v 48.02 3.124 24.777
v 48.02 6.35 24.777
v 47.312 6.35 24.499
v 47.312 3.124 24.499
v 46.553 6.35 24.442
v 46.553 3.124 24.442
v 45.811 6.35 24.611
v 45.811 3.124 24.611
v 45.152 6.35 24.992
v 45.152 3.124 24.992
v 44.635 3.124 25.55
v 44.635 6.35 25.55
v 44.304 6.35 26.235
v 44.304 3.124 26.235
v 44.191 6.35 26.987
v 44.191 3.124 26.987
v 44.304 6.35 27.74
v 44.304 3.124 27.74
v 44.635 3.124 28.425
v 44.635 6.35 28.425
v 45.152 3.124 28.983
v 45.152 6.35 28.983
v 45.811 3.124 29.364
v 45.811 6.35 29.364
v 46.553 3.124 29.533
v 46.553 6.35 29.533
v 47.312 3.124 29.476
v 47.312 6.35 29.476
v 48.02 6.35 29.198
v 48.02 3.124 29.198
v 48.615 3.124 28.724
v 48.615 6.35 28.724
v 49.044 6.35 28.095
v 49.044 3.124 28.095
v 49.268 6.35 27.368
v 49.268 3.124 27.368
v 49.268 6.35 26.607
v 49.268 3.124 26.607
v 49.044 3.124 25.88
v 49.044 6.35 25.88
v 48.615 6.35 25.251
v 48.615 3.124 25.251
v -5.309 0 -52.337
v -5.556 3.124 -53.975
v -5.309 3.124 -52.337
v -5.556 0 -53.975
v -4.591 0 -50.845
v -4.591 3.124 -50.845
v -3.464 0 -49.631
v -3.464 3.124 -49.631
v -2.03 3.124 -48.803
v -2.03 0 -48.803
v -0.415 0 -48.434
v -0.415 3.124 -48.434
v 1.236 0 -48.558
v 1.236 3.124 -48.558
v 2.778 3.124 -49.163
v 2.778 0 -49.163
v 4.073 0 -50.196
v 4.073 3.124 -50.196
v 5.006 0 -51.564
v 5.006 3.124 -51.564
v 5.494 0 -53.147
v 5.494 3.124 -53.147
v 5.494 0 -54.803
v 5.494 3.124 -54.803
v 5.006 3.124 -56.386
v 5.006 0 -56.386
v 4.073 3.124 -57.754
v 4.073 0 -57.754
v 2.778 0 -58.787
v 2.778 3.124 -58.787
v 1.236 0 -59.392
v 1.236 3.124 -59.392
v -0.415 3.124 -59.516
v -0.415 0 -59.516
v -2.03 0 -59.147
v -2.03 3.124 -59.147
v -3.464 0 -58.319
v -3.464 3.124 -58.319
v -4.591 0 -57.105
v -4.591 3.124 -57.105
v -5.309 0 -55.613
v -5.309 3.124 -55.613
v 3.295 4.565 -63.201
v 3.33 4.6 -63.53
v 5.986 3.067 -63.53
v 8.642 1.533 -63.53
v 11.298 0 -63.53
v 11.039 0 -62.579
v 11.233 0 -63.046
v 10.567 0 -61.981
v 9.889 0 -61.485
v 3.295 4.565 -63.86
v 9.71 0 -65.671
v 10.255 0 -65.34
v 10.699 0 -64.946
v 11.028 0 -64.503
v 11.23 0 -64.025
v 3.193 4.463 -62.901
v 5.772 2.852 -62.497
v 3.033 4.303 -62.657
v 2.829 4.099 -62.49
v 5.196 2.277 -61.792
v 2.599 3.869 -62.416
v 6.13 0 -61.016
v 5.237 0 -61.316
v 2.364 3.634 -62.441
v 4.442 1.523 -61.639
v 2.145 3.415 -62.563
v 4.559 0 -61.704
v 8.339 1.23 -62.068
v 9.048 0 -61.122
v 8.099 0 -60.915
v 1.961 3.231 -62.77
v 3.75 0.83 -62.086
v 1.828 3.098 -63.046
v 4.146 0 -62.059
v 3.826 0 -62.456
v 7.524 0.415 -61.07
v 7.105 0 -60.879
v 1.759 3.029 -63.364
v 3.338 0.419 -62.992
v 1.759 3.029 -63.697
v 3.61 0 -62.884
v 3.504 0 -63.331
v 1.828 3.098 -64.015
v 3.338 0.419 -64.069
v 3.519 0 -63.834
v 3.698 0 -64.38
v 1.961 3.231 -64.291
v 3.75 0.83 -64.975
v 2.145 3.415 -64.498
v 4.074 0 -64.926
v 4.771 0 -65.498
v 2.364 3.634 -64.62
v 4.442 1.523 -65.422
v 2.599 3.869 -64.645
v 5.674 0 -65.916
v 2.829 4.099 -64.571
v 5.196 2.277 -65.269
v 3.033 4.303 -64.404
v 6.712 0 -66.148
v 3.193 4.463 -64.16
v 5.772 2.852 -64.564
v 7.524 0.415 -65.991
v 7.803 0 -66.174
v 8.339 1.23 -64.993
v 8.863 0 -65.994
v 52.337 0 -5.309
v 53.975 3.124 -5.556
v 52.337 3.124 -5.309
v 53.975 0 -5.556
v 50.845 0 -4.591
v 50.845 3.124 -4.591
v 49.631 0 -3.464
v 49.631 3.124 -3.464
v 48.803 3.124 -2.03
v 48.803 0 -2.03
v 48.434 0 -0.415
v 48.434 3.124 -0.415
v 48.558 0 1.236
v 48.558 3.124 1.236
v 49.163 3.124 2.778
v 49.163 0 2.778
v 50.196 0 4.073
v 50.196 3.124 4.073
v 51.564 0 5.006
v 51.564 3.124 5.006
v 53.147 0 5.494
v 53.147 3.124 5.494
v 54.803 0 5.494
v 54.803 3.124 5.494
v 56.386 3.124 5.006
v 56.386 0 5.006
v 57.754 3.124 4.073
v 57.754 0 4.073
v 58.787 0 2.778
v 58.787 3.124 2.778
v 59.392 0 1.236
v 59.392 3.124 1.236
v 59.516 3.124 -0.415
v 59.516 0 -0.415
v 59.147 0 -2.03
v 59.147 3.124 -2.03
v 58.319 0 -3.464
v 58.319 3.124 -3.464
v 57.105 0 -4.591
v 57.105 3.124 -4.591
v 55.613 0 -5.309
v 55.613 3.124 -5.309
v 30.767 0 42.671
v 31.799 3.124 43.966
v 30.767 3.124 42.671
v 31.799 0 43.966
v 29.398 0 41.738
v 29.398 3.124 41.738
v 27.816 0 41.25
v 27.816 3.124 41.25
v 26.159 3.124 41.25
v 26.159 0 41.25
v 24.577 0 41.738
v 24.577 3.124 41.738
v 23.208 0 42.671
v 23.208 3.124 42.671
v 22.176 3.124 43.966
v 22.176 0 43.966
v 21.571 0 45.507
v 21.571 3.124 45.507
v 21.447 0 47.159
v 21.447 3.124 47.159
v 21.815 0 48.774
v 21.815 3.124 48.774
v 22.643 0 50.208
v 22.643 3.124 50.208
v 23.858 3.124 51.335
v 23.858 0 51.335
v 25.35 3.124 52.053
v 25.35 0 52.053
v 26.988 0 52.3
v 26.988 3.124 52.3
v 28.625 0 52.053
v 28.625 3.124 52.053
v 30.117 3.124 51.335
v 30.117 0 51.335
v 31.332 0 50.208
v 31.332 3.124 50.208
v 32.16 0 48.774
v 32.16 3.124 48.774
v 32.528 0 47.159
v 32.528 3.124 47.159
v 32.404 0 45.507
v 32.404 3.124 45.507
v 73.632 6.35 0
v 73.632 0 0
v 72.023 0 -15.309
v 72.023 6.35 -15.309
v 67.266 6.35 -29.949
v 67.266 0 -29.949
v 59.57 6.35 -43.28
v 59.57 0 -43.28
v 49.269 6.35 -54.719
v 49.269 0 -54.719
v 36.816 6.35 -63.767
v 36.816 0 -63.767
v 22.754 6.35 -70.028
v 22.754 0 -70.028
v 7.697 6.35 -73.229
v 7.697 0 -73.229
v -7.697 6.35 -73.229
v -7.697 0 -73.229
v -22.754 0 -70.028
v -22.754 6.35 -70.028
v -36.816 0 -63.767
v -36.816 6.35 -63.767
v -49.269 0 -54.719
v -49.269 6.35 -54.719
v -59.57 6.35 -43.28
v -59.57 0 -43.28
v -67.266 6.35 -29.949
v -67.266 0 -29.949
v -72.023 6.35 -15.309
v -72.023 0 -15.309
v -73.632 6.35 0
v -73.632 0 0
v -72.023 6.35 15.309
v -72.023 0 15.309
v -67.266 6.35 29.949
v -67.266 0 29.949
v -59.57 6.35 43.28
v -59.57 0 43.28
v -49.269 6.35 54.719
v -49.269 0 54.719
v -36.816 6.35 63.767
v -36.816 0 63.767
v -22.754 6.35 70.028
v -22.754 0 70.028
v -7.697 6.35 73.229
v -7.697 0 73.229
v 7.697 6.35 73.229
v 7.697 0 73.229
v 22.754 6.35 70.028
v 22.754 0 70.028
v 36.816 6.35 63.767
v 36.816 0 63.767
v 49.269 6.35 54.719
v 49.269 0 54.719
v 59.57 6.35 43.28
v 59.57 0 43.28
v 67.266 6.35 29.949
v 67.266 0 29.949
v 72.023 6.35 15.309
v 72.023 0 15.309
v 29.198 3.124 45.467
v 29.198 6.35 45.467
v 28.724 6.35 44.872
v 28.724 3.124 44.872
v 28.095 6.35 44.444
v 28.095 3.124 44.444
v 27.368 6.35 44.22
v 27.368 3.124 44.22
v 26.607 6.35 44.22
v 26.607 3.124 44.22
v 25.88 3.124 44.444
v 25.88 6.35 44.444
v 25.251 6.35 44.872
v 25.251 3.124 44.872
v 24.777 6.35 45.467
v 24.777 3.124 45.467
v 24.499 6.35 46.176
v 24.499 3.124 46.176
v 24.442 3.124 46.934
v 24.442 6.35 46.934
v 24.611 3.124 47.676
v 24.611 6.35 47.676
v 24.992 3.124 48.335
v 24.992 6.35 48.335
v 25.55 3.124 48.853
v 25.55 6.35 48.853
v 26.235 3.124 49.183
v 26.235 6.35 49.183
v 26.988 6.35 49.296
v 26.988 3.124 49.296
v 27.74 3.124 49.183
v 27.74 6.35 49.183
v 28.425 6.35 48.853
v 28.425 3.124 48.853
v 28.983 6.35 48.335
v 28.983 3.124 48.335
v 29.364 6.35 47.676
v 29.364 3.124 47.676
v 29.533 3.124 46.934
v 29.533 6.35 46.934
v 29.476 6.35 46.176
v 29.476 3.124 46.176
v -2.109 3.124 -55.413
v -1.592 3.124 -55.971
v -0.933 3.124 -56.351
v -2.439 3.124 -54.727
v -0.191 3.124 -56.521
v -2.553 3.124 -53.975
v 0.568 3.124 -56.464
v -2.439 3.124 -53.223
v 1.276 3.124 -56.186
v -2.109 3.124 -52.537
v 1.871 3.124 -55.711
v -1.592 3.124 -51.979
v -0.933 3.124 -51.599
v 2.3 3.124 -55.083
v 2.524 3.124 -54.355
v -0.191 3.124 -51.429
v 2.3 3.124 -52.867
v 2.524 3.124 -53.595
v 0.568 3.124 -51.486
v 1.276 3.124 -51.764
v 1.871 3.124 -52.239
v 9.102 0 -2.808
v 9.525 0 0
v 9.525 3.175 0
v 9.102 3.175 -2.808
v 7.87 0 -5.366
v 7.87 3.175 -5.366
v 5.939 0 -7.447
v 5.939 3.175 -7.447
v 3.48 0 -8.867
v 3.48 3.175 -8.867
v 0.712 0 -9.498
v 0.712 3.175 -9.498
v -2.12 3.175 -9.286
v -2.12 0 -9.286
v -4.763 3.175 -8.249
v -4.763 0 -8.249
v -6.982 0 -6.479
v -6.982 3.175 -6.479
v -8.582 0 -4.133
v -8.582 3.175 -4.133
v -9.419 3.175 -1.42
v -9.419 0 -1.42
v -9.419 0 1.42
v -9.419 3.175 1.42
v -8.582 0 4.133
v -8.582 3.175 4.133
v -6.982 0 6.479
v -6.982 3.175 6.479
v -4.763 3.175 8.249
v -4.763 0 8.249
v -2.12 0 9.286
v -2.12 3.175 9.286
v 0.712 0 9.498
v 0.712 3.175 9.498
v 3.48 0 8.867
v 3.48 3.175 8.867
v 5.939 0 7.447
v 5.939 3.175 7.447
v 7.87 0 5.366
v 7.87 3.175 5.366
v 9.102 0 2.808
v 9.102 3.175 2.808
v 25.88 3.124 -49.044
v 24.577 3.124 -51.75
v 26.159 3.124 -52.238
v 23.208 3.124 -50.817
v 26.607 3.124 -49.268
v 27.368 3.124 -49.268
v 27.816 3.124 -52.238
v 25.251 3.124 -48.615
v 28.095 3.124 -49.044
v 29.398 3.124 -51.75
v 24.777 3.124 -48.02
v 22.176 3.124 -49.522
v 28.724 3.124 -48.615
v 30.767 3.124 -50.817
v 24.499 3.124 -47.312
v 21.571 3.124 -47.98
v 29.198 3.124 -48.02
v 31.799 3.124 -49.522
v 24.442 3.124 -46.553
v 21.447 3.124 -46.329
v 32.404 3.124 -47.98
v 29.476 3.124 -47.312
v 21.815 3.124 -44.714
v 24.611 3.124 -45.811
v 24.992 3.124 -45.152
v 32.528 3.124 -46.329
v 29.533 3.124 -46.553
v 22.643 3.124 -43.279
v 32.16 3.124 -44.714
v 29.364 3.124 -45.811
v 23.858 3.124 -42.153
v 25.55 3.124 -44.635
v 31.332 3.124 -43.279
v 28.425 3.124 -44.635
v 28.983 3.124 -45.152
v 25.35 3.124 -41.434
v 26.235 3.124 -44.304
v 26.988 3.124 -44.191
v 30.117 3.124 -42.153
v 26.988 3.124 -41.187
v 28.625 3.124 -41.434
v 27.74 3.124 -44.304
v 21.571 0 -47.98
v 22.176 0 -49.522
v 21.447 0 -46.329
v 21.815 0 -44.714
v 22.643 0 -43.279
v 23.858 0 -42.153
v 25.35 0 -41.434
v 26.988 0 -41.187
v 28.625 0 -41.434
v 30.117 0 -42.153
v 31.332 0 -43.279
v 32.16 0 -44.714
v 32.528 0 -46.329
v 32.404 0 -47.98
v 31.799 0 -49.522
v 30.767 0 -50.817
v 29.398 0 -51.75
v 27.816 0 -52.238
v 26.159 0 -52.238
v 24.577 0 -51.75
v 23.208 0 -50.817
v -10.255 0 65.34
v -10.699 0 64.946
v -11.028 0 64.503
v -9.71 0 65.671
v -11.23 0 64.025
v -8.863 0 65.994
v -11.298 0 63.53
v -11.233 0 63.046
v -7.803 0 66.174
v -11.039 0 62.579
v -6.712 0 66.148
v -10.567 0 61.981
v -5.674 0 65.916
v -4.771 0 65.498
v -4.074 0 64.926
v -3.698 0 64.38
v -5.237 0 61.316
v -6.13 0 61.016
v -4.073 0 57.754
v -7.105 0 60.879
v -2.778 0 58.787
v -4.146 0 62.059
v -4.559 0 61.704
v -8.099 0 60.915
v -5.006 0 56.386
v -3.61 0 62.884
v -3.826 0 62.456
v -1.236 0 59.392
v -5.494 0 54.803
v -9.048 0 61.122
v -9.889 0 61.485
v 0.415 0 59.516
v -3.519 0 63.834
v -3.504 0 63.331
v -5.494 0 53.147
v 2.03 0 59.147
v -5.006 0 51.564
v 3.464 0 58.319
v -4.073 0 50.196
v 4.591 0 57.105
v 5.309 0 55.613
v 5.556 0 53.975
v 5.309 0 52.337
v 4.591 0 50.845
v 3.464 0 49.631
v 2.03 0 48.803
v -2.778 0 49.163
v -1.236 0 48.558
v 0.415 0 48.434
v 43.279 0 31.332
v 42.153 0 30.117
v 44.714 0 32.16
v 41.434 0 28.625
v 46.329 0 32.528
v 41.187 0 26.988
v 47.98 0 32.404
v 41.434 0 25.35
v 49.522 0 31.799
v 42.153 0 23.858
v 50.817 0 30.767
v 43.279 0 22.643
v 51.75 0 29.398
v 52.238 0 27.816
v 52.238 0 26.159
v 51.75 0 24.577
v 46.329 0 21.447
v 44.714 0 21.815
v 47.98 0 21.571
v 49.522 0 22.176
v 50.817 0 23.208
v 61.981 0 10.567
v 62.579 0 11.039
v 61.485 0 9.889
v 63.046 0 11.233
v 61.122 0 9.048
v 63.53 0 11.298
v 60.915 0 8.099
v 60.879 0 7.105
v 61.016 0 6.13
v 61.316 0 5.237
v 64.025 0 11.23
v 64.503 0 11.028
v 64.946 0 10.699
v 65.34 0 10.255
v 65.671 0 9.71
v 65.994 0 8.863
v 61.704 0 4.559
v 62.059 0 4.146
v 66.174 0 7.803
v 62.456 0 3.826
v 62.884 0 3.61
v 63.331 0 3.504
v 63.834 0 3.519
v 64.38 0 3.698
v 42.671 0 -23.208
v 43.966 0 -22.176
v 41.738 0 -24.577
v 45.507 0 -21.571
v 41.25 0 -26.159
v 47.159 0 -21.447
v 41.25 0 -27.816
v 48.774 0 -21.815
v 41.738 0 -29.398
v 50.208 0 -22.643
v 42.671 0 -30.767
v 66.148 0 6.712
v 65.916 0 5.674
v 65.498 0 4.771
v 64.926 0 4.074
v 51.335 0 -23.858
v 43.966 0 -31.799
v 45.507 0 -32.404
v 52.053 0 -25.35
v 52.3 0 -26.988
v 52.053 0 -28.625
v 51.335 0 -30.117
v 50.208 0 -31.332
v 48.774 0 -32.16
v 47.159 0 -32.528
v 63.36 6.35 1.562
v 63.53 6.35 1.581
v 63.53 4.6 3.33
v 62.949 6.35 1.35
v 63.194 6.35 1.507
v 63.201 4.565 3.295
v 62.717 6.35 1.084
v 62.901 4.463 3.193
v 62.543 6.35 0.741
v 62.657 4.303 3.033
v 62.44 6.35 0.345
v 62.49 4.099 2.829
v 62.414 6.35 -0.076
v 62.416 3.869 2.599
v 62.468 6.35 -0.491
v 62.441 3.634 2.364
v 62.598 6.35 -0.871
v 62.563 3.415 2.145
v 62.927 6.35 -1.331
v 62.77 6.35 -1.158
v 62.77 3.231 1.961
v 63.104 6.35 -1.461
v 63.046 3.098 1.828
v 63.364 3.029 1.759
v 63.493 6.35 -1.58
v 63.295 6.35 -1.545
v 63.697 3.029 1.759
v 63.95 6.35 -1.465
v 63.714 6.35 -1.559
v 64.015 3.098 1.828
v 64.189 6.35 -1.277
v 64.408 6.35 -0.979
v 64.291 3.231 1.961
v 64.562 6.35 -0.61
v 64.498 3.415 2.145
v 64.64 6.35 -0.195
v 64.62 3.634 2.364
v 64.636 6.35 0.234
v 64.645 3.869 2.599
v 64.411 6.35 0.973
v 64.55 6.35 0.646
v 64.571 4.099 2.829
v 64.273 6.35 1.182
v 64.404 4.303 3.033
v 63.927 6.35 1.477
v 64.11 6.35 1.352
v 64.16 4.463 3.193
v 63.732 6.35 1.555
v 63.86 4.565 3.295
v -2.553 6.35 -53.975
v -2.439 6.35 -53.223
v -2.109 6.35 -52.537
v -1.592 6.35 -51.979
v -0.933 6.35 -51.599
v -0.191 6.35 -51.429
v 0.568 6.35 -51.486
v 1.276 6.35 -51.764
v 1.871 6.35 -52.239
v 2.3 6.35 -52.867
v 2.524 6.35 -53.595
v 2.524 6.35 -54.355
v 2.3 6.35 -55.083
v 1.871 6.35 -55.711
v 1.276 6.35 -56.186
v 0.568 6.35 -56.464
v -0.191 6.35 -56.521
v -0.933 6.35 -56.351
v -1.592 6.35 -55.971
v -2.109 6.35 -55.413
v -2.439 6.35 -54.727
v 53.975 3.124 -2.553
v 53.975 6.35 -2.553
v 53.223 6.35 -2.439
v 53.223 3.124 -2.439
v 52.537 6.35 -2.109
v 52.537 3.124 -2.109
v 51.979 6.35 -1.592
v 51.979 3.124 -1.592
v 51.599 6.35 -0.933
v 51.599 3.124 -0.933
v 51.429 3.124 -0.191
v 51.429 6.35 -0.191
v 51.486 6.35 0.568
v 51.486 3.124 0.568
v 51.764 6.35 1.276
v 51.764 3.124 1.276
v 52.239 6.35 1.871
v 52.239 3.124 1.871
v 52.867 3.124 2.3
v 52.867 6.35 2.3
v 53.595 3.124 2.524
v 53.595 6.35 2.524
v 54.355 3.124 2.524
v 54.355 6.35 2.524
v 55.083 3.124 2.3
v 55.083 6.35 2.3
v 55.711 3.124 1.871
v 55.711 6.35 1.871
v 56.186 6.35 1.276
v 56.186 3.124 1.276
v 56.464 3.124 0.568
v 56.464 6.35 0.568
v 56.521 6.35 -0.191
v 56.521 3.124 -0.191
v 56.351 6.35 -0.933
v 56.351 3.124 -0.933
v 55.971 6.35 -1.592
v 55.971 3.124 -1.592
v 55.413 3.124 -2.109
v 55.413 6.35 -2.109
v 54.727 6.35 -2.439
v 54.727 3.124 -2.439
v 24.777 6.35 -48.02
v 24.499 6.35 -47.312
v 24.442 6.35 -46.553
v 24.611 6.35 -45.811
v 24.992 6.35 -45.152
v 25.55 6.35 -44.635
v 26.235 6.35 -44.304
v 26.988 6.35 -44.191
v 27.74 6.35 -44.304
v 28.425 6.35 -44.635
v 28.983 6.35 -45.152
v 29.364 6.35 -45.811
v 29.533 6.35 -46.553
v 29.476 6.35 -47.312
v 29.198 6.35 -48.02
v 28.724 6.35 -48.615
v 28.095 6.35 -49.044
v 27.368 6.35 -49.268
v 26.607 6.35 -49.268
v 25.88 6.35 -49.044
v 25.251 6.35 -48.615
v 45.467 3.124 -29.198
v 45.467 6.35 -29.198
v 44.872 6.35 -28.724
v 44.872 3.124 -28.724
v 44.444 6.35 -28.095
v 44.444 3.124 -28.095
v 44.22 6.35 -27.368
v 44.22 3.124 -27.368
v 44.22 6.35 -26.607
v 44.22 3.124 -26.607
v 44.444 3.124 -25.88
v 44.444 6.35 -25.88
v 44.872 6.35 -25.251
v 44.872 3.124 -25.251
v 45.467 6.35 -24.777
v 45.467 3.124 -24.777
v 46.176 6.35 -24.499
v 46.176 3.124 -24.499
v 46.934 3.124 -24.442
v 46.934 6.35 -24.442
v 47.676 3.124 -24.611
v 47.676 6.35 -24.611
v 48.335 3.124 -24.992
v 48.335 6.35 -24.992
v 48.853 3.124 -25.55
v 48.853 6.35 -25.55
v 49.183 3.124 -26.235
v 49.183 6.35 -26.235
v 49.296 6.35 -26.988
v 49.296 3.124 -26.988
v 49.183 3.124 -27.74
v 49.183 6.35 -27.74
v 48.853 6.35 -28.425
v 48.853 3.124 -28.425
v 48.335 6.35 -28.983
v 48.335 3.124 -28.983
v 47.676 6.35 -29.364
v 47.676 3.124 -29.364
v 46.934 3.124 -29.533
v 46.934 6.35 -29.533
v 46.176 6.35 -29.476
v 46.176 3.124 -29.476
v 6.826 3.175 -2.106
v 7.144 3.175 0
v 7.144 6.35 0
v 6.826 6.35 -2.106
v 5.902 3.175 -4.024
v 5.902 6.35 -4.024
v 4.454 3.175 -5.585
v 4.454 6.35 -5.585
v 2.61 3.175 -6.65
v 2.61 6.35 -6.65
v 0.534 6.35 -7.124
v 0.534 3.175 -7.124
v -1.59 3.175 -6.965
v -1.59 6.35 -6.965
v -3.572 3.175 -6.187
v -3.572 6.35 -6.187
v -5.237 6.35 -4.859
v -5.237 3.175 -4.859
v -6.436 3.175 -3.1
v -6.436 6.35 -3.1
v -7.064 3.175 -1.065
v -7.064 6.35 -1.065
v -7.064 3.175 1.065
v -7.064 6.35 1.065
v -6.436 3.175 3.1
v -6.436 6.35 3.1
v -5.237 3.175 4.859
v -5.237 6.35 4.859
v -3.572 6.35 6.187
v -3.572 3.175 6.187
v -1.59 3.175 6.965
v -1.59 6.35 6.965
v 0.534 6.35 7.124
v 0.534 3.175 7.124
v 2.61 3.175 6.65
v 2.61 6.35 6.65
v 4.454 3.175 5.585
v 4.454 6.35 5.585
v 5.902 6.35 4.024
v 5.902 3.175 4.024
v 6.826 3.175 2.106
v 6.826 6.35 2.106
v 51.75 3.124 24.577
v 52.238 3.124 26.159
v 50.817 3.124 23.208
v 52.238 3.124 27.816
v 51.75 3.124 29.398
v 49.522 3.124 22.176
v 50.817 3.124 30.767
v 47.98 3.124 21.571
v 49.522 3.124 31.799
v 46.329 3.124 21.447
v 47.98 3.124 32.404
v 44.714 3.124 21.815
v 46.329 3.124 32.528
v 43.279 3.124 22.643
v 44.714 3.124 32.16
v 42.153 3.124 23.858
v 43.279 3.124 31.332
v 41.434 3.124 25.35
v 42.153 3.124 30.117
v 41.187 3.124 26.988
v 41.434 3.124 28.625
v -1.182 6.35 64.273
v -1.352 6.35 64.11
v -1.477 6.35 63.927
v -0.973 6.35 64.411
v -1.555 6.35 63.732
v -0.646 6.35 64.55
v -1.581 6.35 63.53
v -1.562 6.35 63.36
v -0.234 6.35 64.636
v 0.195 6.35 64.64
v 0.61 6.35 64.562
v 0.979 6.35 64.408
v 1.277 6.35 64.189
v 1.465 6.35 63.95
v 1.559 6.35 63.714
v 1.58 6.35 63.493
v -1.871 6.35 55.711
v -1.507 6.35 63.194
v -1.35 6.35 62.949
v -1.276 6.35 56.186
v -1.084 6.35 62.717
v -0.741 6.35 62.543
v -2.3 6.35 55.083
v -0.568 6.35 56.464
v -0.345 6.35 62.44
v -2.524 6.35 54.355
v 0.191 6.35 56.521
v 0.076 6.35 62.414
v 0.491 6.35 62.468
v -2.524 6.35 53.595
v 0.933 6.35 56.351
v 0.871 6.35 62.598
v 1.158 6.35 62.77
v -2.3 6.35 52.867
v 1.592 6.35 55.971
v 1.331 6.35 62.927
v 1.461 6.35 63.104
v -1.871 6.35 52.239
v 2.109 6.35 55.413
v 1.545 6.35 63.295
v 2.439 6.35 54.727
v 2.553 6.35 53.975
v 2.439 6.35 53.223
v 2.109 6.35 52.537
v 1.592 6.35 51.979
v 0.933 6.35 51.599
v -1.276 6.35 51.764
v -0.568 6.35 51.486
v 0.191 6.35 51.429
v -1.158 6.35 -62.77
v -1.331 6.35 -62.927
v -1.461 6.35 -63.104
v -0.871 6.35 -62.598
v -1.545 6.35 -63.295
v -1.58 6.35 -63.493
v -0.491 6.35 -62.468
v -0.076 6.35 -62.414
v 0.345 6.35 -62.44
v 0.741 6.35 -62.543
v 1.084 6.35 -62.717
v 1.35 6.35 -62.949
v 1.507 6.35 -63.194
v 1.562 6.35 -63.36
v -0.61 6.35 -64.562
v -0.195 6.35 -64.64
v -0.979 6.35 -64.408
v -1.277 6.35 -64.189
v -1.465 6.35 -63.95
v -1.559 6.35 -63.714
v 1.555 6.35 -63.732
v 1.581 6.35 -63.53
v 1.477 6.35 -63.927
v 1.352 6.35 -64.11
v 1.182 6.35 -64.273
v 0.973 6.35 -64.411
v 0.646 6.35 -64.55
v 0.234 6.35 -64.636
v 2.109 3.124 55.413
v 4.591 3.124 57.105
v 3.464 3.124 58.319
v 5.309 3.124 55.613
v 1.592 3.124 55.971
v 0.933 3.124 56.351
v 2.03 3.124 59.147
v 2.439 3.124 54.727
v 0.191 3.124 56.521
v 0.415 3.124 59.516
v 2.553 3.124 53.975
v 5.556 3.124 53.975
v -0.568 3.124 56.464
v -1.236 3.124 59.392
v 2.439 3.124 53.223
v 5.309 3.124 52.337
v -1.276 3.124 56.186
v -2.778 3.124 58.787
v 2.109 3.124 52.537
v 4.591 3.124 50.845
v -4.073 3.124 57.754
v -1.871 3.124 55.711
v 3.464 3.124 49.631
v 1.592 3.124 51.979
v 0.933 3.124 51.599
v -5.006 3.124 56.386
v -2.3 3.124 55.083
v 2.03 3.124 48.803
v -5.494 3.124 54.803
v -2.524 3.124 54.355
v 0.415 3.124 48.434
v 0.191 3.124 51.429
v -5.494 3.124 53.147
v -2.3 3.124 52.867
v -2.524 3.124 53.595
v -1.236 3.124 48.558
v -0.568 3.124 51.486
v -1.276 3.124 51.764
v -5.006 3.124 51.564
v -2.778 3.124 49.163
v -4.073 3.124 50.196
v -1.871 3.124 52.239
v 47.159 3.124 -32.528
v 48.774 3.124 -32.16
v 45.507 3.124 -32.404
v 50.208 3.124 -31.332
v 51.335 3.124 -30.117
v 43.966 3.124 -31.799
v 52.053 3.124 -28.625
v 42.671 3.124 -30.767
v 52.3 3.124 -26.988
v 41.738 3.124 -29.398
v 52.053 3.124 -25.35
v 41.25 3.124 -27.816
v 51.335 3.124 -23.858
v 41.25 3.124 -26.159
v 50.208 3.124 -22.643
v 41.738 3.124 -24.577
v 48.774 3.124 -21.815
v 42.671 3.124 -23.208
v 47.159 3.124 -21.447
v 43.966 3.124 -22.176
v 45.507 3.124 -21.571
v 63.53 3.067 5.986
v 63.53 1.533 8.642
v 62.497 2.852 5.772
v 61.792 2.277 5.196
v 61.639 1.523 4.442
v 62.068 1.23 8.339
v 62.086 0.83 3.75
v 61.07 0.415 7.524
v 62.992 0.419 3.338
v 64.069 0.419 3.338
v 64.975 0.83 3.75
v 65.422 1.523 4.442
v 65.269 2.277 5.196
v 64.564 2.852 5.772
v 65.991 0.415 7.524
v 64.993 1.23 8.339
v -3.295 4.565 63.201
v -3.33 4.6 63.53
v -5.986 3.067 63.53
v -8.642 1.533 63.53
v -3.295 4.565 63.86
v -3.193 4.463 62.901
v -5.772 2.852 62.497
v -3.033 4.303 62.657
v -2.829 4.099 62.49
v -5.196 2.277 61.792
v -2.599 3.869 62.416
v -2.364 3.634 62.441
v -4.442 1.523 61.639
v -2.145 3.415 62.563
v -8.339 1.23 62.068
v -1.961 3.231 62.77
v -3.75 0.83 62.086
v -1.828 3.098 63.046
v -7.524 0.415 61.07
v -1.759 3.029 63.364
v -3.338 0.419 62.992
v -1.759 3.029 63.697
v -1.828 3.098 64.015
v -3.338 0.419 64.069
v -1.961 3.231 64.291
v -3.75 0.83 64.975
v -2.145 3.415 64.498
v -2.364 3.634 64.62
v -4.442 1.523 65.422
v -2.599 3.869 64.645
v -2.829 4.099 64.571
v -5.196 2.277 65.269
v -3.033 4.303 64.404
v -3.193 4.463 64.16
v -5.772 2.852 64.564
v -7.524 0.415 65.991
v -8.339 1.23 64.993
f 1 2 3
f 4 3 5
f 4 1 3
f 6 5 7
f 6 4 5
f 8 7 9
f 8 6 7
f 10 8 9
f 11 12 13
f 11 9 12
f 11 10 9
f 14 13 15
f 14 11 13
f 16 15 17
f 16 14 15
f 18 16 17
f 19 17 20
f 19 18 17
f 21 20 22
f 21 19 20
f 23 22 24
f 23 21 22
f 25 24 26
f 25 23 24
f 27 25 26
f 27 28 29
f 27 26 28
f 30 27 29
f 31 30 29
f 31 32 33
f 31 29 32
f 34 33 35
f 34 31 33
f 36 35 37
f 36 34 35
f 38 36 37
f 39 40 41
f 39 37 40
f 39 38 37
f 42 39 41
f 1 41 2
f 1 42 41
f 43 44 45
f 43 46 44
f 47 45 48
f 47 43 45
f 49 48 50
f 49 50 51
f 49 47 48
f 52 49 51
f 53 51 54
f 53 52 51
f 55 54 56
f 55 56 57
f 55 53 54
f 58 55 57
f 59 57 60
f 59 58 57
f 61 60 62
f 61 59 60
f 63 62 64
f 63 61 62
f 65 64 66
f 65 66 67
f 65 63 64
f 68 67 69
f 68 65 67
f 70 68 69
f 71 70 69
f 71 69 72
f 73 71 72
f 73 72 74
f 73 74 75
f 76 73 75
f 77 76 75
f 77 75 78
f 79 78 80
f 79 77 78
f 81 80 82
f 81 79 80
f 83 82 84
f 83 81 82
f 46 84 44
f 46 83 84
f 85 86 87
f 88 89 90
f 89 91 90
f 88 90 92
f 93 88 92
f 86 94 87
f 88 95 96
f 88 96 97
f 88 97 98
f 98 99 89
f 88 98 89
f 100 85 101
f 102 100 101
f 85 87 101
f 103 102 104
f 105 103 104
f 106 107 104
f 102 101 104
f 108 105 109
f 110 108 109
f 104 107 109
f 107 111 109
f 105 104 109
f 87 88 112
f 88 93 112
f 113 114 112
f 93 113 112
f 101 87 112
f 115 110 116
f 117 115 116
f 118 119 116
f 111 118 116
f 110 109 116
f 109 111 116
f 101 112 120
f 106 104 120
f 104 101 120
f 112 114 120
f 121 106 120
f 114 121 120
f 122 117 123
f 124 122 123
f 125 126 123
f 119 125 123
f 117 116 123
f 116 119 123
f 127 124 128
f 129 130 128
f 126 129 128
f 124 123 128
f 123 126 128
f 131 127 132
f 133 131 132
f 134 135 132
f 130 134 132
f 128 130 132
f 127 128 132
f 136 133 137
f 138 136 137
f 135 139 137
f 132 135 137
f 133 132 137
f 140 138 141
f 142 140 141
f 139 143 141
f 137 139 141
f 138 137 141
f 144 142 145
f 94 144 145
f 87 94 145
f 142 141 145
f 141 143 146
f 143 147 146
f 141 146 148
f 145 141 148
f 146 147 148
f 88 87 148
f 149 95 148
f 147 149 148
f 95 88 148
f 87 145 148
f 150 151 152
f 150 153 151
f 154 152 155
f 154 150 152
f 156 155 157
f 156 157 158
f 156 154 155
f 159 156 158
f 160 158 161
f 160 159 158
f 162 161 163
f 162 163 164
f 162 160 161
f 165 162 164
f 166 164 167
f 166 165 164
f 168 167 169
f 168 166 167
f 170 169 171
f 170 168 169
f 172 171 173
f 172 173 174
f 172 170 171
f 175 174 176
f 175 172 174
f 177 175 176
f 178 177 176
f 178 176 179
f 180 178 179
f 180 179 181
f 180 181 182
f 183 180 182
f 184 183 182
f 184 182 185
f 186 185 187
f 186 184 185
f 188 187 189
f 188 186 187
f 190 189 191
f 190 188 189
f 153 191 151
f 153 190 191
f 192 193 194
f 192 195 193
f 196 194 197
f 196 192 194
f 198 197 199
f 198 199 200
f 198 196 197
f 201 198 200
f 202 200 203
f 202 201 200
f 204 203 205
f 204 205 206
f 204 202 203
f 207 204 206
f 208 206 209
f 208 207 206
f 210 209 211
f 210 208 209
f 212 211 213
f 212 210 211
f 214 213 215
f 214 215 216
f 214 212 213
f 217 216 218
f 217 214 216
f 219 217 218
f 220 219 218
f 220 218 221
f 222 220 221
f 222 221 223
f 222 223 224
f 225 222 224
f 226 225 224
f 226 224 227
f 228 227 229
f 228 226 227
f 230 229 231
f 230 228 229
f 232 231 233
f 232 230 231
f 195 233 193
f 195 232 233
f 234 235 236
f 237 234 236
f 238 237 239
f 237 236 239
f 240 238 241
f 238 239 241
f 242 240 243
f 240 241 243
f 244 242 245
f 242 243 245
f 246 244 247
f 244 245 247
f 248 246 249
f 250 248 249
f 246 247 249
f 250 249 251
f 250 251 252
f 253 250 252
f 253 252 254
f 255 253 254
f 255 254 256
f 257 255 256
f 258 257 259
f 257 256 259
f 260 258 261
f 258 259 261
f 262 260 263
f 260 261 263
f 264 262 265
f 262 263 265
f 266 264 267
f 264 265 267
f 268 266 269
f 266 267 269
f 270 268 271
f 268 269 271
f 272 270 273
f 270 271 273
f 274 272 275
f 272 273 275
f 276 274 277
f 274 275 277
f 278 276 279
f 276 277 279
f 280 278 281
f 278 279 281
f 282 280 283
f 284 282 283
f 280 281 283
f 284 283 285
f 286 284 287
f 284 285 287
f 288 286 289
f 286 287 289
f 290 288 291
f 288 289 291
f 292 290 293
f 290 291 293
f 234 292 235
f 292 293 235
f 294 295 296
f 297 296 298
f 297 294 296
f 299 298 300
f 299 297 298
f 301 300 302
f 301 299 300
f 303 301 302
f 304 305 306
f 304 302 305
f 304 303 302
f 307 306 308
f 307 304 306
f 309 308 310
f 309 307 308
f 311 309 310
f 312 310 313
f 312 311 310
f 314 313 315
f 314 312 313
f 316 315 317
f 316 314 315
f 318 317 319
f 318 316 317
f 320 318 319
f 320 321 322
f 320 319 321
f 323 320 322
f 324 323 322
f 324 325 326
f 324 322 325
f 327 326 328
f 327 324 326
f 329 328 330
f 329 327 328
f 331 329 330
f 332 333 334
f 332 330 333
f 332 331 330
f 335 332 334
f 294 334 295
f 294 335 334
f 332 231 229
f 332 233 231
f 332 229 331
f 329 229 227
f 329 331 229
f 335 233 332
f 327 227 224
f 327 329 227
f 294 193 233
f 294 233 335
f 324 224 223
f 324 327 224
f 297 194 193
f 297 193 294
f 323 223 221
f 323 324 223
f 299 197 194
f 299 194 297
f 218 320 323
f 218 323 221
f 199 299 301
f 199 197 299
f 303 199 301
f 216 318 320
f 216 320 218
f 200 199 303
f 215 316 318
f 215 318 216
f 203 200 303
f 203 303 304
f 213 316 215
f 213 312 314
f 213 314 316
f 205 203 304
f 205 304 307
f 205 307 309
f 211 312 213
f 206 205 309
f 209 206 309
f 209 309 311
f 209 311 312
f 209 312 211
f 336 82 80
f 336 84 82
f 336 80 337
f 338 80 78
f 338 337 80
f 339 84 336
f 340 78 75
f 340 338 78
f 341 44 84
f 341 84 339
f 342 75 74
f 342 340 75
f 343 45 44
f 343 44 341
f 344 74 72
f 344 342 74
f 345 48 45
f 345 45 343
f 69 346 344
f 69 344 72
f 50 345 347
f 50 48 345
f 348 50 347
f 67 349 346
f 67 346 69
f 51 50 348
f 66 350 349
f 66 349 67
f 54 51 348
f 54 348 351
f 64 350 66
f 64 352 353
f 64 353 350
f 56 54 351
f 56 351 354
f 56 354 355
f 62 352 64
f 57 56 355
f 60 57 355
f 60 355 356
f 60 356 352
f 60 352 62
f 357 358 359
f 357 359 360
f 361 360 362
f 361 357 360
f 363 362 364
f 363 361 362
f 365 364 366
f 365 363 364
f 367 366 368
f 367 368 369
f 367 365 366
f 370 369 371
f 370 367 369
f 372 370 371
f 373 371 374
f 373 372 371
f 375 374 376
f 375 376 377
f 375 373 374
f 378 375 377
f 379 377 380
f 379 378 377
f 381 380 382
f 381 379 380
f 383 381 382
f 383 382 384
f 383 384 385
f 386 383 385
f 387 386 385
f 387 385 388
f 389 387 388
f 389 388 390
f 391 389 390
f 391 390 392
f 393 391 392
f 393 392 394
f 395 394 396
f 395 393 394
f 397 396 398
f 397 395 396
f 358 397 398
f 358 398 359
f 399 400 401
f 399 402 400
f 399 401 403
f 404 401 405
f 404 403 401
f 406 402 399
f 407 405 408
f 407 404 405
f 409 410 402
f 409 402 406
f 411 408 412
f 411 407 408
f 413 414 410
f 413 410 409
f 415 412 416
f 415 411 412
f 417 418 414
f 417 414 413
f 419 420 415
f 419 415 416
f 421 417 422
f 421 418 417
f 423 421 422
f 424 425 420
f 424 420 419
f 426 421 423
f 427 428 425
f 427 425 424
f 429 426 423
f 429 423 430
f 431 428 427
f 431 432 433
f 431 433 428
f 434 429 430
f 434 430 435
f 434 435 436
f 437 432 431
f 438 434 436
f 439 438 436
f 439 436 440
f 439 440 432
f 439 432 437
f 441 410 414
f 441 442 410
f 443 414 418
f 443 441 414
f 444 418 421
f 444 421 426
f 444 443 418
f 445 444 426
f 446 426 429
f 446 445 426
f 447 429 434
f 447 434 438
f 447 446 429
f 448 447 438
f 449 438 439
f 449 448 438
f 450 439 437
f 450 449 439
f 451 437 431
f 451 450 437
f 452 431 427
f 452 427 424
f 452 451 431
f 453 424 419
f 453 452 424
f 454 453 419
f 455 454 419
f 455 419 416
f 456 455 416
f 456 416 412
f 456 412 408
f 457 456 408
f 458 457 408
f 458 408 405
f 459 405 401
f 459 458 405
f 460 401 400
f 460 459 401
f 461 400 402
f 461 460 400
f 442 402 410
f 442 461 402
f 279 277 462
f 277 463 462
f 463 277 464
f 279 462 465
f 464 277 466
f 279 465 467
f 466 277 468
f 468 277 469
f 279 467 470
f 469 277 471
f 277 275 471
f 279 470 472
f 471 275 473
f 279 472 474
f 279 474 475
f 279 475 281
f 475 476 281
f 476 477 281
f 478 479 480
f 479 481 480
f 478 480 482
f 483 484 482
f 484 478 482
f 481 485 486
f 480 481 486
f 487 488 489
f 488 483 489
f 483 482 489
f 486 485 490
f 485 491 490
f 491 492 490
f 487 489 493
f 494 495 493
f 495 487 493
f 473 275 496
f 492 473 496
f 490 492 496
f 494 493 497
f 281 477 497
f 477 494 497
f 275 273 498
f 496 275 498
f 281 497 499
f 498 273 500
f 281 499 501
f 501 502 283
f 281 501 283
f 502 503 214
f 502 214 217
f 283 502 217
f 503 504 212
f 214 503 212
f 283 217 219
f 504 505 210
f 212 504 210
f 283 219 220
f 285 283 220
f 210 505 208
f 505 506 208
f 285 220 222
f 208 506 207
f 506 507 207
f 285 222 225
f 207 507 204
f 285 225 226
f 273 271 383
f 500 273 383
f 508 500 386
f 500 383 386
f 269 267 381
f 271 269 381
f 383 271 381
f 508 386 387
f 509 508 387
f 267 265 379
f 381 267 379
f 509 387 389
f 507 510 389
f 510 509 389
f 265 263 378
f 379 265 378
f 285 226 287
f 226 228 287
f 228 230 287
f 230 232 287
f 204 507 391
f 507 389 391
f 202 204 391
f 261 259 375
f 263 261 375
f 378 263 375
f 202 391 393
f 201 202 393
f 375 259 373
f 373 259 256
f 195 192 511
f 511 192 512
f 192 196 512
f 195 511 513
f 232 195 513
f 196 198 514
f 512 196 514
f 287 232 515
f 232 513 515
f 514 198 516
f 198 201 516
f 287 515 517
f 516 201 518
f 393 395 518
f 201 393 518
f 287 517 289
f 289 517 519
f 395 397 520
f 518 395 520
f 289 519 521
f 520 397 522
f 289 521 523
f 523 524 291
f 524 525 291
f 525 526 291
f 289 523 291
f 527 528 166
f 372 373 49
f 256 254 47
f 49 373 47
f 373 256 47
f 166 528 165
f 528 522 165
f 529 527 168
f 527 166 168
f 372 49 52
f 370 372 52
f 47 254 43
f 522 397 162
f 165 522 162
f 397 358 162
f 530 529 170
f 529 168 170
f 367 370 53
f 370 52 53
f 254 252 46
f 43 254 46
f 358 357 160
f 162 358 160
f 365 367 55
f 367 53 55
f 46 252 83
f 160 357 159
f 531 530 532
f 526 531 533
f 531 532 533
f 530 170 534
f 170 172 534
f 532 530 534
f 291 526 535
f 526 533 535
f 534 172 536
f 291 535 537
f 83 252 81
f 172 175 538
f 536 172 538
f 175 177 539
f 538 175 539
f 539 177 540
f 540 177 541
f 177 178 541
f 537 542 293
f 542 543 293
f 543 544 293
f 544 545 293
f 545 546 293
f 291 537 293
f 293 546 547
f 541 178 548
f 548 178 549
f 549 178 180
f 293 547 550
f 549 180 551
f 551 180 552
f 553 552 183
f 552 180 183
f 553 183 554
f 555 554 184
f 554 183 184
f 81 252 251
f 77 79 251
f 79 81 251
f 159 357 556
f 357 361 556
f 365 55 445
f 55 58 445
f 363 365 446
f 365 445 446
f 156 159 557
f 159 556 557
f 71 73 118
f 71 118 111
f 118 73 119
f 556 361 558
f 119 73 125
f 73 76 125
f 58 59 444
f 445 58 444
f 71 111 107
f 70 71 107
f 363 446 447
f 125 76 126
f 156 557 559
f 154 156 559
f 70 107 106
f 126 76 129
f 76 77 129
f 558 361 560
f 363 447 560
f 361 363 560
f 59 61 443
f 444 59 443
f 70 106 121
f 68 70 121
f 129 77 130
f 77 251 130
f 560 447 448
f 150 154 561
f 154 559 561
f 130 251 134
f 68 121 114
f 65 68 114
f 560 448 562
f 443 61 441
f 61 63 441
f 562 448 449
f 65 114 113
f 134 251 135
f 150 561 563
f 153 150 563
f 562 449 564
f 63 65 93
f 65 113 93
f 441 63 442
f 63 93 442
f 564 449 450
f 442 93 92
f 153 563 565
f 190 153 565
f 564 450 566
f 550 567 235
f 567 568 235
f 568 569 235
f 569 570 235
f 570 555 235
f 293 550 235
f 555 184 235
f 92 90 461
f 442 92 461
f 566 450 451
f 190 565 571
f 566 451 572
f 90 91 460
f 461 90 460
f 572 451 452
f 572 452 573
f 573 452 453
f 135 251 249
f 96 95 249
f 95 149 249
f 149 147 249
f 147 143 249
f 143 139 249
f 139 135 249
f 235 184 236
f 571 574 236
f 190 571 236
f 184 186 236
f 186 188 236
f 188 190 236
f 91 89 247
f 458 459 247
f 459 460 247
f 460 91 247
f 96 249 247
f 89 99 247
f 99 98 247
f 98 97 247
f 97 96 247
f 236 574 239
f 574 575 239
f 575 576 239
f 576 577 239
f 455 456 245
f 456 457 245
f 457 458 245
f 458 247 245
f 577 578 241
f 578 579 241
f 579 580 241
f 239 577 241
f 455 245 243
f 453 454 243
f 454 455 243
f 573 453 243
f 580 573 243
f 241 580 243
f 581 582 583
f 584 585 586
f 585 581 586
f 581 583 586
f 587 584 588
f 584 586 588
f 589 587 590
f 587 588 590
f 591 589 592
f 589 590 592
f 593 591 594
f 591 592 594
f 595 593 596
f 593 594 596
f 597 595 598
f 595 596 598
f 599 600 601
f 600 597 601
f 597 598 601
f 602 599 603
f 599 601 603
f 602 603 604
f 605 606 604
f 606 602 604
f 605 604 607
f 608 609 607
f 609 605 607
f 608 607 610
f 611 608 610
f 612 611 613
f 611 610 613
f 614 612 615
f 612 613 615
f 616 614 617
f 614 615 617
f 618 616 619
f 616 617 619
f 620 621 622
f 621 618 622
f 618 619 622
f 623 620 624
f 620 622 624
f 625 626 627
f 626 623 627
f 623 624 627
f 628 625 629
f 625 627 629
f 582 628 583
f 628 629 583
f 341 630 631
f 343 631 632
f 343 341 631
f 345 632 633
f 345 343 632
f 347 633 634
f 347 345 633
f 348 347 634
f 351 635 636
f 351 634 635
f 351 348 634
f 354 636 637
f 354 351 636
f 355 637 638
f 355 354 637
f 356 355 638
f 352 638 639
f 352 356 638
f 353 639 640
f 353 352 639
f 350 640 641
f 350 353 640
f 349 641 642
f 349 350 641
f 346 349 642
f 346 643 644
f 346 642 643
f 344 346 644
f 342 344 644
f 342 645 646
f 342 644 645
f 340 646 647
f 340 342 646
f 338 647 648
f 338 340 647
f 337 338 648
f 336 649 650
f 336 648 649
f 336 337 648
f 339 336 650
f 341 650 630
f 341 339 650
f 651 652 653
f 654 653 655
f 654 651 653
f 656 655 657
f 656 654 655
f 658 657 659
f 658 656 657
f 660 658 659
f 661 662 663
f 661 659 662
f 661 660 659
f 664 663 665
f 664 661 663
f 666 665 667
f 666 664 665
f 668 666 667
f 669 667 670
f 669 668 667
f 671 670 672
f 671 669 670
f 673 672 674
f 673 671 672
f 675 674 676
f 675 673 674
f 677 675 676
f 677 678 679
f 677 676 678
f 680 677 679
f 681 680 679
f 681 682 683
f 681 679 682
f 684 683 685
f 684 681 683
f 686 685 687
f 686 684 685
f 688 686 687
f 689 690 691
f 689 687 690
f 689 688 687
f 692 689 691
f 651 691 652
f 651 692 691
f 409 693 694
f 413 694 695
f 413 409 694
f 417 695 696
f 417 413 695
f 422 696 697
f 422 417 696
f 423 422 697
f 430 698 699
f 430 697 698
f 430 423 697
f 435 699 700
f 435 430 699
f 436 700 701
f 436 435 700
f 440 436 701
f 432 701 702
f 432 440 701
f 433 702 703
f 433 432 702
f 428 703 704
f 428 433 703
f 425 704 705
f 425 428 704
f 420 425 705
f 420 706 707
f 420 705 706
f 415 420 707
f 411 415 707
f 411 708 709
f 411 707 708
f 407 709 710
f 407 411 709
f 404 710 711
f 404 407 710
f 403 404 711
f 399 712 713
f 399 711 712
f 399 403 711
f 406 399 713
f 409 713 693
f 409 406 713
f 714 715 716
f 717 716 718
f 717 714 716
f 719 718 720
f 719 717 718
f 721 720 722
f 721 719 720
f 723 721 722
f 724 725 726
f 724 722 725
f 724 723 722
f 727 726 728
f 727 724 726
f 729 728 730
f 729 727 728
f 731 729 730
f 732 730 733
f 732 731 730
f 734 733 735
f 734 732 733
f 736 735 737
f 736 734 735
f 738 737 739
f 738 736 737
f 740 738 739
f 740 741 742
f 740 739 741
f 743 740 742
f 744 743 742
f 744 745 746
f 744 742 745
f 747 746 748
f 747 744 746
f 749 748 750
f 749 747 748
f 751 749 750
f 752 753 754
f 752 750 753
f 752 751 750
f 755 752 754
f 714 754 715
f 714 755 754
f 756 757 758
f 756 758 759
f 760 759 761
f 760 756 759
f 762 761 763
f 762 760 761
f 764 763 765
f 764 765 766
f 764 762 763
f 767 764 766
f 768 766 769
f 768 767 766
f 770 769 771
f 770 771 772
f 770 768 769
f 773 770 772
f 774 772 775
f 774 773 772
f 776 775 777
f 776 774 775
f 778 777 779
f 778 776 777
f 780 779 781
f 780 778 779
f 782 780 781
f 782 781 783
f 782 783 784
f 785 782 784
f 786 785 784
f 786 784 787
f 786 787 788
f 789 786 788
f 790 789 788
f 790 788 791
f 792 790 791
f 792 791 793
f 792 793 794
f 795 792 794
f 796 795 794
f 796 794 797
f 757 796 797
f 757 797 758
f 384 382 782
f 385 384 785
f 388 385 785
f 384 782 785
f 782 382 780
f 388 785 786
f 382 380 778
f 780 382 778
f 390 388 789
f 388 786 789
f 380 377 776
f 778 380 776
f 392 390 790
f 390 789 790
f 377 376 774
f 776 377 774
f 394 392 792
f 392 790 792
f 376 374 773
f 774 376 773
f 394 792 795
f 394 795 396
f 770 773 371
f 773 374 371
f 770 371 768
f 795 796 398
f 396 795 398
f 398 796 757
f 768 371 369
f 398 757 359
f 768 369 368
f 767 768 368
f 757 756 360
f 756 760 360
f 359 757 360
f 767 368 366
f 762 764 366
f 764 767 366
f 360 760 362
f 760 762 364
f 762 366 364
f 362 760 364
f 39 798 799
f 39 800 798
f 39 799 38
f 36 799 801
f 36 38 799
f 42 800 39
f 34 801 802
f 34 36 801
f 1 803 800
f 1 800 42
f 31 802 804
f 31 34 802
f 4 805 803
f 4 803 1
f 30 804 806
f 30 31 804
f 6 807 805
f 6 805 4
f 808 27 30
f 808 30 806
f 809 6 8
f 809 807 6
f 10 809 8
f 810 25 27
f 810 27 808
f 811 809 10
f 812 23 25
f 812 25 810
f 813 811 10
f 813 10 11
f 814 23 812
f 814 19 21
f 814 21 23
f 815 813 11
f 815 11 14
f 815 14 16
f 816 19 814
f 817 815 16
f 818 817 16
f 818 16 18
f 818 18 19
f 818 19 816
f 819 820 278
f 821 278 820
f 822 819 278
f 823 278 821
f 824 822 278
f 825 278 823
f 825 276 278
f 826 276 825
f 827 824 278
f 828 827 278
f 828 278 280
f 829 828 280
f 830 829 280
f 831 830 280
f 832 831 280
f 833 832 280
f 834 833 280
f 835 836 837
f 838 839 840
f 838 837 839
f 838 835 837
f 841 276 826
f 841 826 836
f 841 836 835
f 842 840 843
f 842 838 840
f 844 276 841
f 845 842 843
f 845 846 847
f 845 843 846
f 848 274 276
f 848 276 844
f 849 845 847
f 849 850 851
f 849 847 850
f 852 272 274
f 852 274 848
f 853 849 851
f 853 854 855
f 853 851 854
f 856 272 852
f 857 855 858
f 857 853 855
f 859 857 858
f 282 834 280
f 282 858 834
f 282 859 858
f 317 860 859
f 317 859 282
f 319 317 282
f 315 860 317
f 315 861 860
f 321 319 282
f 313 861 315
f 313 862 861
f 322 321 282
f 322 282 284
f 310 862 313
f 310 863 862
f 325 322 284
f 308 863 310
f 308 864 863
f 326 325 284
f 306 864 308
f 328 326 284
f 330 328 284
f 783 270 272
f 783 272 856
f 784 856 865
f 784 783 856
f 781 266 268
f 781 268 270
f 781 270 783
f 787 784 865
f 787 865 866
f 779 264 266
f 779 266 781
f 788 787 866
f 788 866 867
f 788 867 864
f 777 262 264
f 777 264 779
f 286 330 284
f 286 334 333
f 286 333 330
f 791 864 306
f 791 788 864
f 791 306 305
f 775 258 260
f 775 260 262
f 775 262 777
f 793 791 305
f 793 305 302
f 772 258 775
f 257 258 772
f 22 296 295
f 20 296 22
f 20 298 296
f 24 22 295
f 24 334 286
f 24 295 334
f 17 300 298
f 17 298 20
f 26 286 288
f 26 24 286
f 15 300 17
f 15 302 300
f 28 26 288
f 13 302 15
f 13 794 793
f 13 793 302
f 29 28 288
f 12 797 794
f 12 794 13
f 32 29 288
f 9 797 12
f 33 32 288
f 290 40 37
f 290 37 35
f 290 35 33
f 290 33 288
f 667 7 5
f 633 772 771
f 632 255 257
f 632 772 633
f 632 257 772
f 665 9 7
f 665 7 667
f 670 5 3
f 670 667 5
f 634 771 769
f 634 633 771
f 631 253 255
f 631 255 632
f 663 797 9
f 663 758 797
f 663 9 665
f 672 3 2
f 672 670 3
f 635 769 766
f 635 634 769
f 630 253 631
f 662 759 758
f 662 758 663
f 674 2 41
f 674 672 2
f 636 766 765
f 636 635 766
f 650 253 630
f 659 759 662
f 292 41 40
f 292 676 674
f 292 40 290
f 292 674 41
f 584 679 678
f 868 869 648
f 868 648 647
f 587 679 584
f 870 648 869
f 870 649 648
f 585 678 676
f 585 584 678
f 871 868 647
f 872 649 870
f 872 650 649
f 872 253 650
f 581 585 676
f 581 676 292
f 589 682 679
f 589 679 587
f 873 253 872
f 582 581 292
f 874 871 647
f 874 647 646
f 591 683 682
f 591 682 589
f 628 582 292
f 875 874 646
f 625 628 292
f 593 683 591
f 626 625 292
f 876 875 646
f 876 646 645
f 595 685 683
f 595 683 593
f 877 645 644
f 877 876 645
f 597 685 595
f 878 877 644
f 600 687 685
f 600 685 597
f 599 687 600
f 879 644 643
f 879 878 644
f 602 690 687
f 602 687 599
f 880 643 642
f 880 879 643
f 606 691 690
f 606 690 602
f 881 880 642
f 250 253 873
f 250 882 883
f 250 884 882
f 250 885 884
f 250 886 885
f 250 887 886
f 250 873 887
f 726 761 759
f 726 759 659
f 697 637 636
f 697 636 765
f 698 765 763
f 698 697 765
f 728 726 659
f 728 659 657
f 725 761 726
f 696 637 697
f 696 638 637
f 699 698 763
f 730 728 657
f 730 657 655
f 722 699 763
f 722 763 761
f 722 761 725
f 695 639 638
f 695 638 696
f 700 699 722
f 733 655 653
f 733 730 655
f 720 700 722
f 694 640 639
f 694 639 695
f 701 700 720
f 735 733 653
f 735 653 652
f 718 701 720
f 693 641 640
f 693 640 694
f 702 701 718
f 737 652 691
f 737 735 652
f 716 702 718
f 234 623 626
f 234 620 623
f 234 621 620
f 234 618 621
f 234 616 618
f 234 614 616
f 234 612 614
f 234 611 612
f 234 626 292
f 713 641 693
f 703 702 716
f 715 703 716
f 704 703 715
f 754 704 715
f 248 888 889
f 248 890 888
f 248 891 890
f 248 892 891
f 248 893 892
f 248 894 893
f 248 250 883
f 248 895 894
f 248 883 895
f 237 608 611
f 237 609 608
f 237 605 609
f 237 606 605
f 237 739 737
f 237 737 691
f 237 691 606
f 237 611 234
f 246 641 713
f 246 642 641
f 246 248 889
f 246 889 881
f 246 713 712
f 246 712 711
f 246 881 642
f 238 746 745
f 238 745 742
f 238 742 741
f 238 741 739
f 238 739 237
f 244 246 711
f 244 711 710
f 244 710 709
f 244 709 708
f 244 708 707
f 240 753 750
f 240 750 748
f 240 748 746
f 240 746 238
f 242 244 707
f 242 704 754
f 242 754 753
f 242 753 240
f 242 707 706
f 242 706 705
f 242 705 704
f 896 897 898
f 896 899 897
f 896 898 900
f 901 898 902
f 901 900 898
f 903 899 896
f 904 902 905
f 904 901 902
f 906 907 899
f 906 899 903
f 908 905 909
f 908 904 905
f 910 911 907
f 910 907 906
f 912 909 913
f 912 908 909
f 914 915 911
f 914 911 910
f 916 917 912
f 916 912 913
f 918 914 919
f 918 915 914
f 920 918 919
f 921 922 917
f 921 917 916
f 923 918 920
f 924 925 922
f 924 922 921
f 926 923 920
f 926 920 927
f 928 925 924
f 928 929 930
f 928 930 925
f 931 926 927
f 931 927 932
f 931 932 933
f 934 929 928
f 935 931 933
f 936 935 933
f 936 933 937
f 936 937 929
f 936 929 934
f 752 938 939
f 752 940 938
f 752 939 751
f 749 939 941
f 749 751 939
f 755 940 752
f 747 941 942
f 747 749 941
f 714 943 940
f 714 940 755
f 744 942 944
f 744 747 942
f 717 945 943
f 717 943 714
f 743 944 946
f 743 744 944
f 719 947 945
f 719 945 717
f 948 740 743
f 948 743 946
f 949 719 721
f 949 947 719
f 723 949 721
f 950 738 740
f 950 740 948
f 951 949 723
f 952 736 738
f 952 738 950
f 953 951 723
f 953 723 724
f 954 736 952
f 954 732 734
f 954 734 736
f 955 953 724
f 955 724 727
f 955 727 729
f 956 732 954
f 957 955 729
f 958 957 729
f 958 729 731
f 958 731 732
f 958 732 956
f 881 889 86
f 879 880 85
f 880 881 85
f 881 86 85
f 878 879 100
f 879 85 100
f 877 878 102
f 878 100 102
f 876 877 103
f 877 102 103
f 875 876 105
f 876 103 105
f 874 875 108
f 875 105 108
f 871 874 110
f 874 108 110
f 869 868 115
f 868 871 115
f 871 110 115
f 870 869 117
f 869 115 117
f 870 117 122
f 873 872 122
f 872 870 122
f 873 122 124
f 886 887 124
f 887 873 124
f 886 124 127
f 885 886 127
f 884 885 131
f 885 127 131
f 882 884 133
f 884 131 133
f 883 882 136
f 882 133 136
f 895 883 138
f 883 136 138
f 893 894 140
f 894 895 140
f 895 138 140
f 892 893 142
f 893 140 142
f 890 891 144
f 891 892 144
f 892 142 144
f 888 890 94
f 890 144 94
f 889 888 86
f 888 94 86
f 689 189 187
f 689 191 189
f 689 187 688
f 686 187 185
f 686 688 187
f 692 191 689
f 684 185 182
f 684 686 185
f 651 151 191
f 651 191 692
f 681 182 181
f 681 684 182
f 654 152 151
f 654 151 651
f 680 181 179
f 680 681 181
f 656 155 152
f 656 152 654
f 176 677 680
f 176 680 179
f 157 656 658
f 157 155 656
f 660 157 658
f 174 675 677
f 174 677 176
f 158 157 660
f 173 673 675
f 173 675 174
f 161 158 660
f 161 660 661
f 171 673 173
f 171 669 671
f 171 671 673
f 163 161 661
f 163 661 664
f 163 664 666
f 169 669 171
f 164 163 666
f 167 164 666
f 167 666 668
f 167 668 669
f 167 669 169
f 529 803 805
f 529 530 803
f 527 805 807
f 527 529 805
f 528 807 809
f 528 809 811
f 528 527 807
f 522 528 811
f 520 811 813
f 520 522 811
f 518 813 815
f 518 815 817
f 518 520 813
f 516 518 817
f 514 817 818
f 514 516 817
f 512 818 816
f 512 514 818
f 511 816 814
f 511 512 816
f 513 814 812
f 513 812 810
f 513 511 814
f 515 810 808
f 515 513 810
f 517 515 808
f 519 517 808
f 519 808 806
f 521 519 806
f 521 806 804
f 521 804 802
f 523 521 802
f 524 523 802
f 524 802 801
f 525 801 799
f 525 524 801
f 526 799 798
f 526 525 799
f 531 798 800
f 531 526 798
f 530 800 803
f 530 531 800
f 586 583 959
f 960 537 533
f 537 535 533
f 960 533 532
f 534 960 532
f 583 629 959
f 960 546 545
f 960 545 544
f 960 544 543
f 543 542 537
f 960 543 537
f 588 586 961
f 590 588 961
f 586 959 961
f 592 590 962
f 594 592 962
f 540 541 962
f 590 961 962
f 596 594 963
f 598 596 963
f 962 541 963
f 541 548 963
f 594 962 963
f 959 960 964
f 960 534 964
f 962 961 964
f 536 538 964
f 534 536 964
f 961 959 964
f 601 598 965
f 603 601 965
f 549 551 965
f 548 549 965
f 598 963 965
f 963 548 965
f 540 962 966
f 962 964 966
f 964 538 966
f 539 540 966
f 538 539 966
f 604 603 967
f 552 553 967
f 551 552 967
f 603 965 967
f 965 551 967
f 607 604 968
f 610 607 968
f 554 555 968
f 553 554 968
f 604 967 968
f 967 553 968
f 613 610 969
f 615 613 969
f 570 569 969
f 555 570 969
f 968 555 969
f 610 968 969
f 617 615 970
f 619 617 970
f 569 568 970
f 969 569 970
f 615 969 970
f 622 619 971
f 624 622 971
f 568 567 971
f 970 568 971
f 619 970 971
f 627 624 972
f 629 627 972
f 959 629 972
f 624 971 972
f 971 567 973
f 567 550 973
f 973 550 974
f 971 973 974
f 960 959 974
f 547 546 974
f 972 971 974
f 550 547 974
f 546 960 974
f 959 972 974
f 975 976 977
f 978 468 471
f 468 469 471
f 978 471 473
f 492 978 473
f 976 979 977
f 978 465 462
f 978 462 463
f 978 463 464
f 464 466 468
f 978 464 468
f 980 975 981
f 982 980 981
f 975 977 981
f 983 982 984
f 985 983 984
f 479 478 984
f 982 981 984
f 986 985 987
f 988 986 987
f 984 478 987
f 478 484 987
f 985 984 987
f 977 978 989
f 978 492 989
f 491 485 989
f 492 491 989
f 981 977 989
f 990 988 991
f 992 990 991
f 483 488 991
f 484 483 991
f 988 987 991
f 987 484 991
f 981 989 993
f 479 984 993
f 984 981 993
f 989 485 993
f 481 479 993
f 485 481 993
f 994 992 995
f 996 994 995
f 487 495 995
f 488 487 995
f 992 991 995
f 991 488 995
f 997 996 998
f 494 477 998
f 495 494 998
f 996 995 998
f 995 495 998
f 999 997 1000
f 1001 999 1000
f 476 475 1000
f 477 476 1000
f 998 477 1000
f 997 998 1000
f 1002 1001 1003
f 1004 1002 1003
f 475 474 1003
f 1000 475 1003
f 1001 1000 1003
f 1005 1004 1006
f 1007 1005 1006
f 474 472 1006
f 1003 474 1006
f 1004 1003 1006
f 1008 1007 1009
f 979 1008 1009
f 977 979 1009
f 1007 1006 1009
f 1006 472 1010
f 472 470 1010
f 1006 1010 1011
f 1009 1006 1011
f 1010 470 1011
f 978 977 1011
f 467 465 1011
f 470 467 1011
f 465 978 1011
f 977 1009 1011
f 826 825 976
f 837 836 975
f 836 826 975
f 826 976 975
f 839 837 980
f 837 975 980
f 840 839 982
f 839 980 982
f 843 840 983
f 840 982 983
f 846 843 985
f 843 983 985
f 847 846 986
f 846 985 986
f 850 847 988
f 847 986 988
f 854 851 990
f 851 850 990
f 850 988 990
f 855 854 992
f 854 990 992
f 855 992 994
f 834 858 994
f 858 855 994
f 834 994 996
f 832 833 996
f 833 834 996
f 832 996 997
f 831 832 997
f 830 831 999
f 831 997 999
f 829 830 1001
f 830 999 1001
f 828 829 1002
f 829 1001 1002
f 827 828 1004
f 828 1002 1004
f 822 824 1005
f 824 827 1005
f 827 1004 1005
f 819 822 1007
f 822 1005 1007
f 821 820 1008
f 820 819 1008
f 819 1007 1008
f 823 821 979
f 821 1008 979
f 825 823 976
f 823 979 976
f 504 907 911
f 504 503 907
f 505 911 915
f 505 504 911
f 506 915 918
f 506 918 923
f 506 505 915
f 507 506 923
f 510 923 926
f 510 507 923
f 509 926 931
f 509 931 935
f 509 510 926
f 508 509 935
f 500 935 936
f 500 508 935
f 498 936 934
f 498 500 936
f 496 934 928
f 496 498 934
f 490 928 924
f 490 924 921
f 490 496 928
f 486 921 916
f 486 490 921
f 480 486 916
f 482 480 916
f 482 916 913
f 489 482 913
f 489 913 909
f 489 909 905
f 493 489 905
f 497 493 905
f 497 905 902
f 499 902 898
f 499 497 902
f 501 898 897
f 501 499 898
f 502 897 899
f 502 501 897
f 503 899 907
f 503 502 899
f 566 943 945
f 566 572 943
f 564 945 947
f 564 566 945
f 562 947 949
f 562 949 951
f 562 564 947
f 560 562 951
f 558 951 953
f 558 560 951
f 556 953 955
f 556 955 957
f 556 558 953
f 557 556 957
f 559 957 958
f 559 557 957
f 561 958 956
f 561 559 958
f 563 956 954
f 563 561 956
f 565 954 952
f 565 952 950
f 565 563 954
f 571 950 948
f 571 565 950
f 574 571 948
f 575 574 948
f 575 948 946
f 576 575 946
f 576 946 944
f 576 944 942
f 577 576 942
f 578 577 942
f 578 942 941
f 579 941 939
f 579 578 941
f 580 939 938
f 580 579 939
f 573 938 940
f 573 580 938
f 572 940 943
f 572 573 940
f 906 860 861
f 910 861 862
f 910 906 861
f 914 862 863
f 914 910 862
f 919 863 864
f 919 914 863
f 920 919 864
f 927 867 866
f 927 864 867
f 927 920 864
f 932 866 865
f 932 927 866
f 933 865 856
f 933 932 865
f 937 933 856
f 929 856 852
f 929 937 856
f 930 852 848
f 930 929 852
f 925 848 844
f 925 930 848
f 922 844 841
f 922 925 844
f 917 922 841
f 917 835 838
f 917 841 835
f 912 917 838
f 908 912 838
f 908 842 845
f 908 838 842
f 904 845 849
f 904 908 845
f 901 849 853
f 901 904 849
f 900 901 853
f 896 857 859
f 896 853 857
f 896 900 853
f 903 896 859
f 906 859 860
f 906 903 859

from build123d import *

# Parameters (mm, degrees)
SKETCH1_R                       = 73.63206
SKETCH1_R_2                     = 9.525
SKETCH1_R_3                     = 7.14375
BOSS_EXTRUDE1_DEPTH             = 6.35
CIRPATTERN1_COUNT               = 2
CIRPATTERN1_ANGLE               = 90
CIRPATTERN1_THE_OTHER_WAY_COUNT = 2
CIRPATTERN1_THE_OTHER_WAY_ANGLE = 90
SKETCH1_4_R                     = 9.525
SKETCH1_4_R_2                   = 7.14375
CUT_EXTRUDE2_DEPTH              = 3.175
CIRPATTERN2_COUNT               = 12


with BuildPart() as part:
    # Sketch1 → Boss-Extrude1 (new body)
    with BuildSketch(Plane(origin=(0, 0, 0), x_dir=(1, 0, 0), z_dir=(0, 1, 0))):
        Circle(SKETCH1_R)
        Circle(SKETCH1_R_2, mode=Mode.SUBTRACT)
        Circle(SKETCH1_R_2)
        Circle(SKETCH1_R_3, mode=Mode.SUBTRACT)
    extrude(amount=BOSS_EXTRUDE1_DEPTH)

    # Sketch2 → Nozzle (revolve, cut)
    with BuildSketch(Plane(origin=(63.53048, 0, 0), x_dir=(0, 0, -1), z_dir=(1, 0, 0))):
        Polygon((-17.960512242, -11.610512242), (17.960512242, 24.310512242), (17.170249703, 25.100774781), (-3.330262539, 4.600262539), (-22.882688583, -6.688335901), align=None)
    nozzle = revolve(axis=Axis((63.53048, 24.310512242, -17.960512242), (0, -0.707106781, 0.707106781)), mode=Mode.SUBTRACT)

    # CirPattern1: Nozzle ×2 about axis
    cirpattern1_axis = Axis((0, 6.35, 0), (0, -1, 0))
    for i in range(1, CIRPATTERN1_COUNT):
        add(nozzle.rotate(cirpattern1_axis, i * CIRPATTERN1_ANGLE / (CIRPATTERN1_COUNT - 1)), mode=Mode.SUBTRACT)

    # CirPattern1 the other way: Nozzle ×2 about axis
    cirpattern1_the_other_way_axis = Axis((0, 6.35, 0), (0, 1, 0))
    for i in range(1, CIRPATTERN1_THE_OTHER_WAY_COUNT):
        add(nozzle.rotate(cirpattern1_the_other_way_axis, i * CIRPATTERN1_THE_OTHER_WAY_ANGLE / (CIRPATTERN1_THE_OTHER_WAY_COUNT - 1)), mode=Mode.SUBTRACT)

    # Sketch1_4 → Cut-Extrude2 (cut)
    with BuildSketch(Plane(origin=(0, 0, 0), x_dir=(1, 0, 0), z_dir=(0, 1, 0))):
        Circle(SKETCH1_4_R)
        Circle(SKETCH1_4_R_2, mode=Mode.SUBTRACT)
    extrude(amount=CUT_EXTRUDE2_DEPTH, mode=Mode.SUBTRACT)

    # Sketch5 → CBORE for _10 Binding Head Machine Screw (revolve, cut)
    with BuildSketch(Plane(origin=(53.975, 0, 0), x_dir=(0, 0, -1), z_dir=(1, 0, 0))):
        Polygon((0, 0), (0, 15.503816902), (2.5527, 13.97), (2.5527, 3.1242), (5.55625, 3.1242), (5.55625, 0), align=None)
    cbore_for_10_binding_head_machine_screw = revolve(axis=Axis((53.975, -6.35, 0), (0, 1, 0)), mode=Mode.SUBTRACT)

    # CirPattern2: CBORE for _10 Binding Head Machine Screw ×12 about axis, 5 skipped
    cirpattern2_axis = Axis((0, 0, 0), (0, -1, 0))
    add([cbore_for_10_binding_head_machine_screw.rotate(cirpattern2_axis, i * 360 / CIRPATTERN2_COUNT) for i in range(1, CIRPATTERN2_COUNT) if i not in (4, 5, 6, 7, 8)], mode=Mode.SUBTRACT)


solid = part.part
